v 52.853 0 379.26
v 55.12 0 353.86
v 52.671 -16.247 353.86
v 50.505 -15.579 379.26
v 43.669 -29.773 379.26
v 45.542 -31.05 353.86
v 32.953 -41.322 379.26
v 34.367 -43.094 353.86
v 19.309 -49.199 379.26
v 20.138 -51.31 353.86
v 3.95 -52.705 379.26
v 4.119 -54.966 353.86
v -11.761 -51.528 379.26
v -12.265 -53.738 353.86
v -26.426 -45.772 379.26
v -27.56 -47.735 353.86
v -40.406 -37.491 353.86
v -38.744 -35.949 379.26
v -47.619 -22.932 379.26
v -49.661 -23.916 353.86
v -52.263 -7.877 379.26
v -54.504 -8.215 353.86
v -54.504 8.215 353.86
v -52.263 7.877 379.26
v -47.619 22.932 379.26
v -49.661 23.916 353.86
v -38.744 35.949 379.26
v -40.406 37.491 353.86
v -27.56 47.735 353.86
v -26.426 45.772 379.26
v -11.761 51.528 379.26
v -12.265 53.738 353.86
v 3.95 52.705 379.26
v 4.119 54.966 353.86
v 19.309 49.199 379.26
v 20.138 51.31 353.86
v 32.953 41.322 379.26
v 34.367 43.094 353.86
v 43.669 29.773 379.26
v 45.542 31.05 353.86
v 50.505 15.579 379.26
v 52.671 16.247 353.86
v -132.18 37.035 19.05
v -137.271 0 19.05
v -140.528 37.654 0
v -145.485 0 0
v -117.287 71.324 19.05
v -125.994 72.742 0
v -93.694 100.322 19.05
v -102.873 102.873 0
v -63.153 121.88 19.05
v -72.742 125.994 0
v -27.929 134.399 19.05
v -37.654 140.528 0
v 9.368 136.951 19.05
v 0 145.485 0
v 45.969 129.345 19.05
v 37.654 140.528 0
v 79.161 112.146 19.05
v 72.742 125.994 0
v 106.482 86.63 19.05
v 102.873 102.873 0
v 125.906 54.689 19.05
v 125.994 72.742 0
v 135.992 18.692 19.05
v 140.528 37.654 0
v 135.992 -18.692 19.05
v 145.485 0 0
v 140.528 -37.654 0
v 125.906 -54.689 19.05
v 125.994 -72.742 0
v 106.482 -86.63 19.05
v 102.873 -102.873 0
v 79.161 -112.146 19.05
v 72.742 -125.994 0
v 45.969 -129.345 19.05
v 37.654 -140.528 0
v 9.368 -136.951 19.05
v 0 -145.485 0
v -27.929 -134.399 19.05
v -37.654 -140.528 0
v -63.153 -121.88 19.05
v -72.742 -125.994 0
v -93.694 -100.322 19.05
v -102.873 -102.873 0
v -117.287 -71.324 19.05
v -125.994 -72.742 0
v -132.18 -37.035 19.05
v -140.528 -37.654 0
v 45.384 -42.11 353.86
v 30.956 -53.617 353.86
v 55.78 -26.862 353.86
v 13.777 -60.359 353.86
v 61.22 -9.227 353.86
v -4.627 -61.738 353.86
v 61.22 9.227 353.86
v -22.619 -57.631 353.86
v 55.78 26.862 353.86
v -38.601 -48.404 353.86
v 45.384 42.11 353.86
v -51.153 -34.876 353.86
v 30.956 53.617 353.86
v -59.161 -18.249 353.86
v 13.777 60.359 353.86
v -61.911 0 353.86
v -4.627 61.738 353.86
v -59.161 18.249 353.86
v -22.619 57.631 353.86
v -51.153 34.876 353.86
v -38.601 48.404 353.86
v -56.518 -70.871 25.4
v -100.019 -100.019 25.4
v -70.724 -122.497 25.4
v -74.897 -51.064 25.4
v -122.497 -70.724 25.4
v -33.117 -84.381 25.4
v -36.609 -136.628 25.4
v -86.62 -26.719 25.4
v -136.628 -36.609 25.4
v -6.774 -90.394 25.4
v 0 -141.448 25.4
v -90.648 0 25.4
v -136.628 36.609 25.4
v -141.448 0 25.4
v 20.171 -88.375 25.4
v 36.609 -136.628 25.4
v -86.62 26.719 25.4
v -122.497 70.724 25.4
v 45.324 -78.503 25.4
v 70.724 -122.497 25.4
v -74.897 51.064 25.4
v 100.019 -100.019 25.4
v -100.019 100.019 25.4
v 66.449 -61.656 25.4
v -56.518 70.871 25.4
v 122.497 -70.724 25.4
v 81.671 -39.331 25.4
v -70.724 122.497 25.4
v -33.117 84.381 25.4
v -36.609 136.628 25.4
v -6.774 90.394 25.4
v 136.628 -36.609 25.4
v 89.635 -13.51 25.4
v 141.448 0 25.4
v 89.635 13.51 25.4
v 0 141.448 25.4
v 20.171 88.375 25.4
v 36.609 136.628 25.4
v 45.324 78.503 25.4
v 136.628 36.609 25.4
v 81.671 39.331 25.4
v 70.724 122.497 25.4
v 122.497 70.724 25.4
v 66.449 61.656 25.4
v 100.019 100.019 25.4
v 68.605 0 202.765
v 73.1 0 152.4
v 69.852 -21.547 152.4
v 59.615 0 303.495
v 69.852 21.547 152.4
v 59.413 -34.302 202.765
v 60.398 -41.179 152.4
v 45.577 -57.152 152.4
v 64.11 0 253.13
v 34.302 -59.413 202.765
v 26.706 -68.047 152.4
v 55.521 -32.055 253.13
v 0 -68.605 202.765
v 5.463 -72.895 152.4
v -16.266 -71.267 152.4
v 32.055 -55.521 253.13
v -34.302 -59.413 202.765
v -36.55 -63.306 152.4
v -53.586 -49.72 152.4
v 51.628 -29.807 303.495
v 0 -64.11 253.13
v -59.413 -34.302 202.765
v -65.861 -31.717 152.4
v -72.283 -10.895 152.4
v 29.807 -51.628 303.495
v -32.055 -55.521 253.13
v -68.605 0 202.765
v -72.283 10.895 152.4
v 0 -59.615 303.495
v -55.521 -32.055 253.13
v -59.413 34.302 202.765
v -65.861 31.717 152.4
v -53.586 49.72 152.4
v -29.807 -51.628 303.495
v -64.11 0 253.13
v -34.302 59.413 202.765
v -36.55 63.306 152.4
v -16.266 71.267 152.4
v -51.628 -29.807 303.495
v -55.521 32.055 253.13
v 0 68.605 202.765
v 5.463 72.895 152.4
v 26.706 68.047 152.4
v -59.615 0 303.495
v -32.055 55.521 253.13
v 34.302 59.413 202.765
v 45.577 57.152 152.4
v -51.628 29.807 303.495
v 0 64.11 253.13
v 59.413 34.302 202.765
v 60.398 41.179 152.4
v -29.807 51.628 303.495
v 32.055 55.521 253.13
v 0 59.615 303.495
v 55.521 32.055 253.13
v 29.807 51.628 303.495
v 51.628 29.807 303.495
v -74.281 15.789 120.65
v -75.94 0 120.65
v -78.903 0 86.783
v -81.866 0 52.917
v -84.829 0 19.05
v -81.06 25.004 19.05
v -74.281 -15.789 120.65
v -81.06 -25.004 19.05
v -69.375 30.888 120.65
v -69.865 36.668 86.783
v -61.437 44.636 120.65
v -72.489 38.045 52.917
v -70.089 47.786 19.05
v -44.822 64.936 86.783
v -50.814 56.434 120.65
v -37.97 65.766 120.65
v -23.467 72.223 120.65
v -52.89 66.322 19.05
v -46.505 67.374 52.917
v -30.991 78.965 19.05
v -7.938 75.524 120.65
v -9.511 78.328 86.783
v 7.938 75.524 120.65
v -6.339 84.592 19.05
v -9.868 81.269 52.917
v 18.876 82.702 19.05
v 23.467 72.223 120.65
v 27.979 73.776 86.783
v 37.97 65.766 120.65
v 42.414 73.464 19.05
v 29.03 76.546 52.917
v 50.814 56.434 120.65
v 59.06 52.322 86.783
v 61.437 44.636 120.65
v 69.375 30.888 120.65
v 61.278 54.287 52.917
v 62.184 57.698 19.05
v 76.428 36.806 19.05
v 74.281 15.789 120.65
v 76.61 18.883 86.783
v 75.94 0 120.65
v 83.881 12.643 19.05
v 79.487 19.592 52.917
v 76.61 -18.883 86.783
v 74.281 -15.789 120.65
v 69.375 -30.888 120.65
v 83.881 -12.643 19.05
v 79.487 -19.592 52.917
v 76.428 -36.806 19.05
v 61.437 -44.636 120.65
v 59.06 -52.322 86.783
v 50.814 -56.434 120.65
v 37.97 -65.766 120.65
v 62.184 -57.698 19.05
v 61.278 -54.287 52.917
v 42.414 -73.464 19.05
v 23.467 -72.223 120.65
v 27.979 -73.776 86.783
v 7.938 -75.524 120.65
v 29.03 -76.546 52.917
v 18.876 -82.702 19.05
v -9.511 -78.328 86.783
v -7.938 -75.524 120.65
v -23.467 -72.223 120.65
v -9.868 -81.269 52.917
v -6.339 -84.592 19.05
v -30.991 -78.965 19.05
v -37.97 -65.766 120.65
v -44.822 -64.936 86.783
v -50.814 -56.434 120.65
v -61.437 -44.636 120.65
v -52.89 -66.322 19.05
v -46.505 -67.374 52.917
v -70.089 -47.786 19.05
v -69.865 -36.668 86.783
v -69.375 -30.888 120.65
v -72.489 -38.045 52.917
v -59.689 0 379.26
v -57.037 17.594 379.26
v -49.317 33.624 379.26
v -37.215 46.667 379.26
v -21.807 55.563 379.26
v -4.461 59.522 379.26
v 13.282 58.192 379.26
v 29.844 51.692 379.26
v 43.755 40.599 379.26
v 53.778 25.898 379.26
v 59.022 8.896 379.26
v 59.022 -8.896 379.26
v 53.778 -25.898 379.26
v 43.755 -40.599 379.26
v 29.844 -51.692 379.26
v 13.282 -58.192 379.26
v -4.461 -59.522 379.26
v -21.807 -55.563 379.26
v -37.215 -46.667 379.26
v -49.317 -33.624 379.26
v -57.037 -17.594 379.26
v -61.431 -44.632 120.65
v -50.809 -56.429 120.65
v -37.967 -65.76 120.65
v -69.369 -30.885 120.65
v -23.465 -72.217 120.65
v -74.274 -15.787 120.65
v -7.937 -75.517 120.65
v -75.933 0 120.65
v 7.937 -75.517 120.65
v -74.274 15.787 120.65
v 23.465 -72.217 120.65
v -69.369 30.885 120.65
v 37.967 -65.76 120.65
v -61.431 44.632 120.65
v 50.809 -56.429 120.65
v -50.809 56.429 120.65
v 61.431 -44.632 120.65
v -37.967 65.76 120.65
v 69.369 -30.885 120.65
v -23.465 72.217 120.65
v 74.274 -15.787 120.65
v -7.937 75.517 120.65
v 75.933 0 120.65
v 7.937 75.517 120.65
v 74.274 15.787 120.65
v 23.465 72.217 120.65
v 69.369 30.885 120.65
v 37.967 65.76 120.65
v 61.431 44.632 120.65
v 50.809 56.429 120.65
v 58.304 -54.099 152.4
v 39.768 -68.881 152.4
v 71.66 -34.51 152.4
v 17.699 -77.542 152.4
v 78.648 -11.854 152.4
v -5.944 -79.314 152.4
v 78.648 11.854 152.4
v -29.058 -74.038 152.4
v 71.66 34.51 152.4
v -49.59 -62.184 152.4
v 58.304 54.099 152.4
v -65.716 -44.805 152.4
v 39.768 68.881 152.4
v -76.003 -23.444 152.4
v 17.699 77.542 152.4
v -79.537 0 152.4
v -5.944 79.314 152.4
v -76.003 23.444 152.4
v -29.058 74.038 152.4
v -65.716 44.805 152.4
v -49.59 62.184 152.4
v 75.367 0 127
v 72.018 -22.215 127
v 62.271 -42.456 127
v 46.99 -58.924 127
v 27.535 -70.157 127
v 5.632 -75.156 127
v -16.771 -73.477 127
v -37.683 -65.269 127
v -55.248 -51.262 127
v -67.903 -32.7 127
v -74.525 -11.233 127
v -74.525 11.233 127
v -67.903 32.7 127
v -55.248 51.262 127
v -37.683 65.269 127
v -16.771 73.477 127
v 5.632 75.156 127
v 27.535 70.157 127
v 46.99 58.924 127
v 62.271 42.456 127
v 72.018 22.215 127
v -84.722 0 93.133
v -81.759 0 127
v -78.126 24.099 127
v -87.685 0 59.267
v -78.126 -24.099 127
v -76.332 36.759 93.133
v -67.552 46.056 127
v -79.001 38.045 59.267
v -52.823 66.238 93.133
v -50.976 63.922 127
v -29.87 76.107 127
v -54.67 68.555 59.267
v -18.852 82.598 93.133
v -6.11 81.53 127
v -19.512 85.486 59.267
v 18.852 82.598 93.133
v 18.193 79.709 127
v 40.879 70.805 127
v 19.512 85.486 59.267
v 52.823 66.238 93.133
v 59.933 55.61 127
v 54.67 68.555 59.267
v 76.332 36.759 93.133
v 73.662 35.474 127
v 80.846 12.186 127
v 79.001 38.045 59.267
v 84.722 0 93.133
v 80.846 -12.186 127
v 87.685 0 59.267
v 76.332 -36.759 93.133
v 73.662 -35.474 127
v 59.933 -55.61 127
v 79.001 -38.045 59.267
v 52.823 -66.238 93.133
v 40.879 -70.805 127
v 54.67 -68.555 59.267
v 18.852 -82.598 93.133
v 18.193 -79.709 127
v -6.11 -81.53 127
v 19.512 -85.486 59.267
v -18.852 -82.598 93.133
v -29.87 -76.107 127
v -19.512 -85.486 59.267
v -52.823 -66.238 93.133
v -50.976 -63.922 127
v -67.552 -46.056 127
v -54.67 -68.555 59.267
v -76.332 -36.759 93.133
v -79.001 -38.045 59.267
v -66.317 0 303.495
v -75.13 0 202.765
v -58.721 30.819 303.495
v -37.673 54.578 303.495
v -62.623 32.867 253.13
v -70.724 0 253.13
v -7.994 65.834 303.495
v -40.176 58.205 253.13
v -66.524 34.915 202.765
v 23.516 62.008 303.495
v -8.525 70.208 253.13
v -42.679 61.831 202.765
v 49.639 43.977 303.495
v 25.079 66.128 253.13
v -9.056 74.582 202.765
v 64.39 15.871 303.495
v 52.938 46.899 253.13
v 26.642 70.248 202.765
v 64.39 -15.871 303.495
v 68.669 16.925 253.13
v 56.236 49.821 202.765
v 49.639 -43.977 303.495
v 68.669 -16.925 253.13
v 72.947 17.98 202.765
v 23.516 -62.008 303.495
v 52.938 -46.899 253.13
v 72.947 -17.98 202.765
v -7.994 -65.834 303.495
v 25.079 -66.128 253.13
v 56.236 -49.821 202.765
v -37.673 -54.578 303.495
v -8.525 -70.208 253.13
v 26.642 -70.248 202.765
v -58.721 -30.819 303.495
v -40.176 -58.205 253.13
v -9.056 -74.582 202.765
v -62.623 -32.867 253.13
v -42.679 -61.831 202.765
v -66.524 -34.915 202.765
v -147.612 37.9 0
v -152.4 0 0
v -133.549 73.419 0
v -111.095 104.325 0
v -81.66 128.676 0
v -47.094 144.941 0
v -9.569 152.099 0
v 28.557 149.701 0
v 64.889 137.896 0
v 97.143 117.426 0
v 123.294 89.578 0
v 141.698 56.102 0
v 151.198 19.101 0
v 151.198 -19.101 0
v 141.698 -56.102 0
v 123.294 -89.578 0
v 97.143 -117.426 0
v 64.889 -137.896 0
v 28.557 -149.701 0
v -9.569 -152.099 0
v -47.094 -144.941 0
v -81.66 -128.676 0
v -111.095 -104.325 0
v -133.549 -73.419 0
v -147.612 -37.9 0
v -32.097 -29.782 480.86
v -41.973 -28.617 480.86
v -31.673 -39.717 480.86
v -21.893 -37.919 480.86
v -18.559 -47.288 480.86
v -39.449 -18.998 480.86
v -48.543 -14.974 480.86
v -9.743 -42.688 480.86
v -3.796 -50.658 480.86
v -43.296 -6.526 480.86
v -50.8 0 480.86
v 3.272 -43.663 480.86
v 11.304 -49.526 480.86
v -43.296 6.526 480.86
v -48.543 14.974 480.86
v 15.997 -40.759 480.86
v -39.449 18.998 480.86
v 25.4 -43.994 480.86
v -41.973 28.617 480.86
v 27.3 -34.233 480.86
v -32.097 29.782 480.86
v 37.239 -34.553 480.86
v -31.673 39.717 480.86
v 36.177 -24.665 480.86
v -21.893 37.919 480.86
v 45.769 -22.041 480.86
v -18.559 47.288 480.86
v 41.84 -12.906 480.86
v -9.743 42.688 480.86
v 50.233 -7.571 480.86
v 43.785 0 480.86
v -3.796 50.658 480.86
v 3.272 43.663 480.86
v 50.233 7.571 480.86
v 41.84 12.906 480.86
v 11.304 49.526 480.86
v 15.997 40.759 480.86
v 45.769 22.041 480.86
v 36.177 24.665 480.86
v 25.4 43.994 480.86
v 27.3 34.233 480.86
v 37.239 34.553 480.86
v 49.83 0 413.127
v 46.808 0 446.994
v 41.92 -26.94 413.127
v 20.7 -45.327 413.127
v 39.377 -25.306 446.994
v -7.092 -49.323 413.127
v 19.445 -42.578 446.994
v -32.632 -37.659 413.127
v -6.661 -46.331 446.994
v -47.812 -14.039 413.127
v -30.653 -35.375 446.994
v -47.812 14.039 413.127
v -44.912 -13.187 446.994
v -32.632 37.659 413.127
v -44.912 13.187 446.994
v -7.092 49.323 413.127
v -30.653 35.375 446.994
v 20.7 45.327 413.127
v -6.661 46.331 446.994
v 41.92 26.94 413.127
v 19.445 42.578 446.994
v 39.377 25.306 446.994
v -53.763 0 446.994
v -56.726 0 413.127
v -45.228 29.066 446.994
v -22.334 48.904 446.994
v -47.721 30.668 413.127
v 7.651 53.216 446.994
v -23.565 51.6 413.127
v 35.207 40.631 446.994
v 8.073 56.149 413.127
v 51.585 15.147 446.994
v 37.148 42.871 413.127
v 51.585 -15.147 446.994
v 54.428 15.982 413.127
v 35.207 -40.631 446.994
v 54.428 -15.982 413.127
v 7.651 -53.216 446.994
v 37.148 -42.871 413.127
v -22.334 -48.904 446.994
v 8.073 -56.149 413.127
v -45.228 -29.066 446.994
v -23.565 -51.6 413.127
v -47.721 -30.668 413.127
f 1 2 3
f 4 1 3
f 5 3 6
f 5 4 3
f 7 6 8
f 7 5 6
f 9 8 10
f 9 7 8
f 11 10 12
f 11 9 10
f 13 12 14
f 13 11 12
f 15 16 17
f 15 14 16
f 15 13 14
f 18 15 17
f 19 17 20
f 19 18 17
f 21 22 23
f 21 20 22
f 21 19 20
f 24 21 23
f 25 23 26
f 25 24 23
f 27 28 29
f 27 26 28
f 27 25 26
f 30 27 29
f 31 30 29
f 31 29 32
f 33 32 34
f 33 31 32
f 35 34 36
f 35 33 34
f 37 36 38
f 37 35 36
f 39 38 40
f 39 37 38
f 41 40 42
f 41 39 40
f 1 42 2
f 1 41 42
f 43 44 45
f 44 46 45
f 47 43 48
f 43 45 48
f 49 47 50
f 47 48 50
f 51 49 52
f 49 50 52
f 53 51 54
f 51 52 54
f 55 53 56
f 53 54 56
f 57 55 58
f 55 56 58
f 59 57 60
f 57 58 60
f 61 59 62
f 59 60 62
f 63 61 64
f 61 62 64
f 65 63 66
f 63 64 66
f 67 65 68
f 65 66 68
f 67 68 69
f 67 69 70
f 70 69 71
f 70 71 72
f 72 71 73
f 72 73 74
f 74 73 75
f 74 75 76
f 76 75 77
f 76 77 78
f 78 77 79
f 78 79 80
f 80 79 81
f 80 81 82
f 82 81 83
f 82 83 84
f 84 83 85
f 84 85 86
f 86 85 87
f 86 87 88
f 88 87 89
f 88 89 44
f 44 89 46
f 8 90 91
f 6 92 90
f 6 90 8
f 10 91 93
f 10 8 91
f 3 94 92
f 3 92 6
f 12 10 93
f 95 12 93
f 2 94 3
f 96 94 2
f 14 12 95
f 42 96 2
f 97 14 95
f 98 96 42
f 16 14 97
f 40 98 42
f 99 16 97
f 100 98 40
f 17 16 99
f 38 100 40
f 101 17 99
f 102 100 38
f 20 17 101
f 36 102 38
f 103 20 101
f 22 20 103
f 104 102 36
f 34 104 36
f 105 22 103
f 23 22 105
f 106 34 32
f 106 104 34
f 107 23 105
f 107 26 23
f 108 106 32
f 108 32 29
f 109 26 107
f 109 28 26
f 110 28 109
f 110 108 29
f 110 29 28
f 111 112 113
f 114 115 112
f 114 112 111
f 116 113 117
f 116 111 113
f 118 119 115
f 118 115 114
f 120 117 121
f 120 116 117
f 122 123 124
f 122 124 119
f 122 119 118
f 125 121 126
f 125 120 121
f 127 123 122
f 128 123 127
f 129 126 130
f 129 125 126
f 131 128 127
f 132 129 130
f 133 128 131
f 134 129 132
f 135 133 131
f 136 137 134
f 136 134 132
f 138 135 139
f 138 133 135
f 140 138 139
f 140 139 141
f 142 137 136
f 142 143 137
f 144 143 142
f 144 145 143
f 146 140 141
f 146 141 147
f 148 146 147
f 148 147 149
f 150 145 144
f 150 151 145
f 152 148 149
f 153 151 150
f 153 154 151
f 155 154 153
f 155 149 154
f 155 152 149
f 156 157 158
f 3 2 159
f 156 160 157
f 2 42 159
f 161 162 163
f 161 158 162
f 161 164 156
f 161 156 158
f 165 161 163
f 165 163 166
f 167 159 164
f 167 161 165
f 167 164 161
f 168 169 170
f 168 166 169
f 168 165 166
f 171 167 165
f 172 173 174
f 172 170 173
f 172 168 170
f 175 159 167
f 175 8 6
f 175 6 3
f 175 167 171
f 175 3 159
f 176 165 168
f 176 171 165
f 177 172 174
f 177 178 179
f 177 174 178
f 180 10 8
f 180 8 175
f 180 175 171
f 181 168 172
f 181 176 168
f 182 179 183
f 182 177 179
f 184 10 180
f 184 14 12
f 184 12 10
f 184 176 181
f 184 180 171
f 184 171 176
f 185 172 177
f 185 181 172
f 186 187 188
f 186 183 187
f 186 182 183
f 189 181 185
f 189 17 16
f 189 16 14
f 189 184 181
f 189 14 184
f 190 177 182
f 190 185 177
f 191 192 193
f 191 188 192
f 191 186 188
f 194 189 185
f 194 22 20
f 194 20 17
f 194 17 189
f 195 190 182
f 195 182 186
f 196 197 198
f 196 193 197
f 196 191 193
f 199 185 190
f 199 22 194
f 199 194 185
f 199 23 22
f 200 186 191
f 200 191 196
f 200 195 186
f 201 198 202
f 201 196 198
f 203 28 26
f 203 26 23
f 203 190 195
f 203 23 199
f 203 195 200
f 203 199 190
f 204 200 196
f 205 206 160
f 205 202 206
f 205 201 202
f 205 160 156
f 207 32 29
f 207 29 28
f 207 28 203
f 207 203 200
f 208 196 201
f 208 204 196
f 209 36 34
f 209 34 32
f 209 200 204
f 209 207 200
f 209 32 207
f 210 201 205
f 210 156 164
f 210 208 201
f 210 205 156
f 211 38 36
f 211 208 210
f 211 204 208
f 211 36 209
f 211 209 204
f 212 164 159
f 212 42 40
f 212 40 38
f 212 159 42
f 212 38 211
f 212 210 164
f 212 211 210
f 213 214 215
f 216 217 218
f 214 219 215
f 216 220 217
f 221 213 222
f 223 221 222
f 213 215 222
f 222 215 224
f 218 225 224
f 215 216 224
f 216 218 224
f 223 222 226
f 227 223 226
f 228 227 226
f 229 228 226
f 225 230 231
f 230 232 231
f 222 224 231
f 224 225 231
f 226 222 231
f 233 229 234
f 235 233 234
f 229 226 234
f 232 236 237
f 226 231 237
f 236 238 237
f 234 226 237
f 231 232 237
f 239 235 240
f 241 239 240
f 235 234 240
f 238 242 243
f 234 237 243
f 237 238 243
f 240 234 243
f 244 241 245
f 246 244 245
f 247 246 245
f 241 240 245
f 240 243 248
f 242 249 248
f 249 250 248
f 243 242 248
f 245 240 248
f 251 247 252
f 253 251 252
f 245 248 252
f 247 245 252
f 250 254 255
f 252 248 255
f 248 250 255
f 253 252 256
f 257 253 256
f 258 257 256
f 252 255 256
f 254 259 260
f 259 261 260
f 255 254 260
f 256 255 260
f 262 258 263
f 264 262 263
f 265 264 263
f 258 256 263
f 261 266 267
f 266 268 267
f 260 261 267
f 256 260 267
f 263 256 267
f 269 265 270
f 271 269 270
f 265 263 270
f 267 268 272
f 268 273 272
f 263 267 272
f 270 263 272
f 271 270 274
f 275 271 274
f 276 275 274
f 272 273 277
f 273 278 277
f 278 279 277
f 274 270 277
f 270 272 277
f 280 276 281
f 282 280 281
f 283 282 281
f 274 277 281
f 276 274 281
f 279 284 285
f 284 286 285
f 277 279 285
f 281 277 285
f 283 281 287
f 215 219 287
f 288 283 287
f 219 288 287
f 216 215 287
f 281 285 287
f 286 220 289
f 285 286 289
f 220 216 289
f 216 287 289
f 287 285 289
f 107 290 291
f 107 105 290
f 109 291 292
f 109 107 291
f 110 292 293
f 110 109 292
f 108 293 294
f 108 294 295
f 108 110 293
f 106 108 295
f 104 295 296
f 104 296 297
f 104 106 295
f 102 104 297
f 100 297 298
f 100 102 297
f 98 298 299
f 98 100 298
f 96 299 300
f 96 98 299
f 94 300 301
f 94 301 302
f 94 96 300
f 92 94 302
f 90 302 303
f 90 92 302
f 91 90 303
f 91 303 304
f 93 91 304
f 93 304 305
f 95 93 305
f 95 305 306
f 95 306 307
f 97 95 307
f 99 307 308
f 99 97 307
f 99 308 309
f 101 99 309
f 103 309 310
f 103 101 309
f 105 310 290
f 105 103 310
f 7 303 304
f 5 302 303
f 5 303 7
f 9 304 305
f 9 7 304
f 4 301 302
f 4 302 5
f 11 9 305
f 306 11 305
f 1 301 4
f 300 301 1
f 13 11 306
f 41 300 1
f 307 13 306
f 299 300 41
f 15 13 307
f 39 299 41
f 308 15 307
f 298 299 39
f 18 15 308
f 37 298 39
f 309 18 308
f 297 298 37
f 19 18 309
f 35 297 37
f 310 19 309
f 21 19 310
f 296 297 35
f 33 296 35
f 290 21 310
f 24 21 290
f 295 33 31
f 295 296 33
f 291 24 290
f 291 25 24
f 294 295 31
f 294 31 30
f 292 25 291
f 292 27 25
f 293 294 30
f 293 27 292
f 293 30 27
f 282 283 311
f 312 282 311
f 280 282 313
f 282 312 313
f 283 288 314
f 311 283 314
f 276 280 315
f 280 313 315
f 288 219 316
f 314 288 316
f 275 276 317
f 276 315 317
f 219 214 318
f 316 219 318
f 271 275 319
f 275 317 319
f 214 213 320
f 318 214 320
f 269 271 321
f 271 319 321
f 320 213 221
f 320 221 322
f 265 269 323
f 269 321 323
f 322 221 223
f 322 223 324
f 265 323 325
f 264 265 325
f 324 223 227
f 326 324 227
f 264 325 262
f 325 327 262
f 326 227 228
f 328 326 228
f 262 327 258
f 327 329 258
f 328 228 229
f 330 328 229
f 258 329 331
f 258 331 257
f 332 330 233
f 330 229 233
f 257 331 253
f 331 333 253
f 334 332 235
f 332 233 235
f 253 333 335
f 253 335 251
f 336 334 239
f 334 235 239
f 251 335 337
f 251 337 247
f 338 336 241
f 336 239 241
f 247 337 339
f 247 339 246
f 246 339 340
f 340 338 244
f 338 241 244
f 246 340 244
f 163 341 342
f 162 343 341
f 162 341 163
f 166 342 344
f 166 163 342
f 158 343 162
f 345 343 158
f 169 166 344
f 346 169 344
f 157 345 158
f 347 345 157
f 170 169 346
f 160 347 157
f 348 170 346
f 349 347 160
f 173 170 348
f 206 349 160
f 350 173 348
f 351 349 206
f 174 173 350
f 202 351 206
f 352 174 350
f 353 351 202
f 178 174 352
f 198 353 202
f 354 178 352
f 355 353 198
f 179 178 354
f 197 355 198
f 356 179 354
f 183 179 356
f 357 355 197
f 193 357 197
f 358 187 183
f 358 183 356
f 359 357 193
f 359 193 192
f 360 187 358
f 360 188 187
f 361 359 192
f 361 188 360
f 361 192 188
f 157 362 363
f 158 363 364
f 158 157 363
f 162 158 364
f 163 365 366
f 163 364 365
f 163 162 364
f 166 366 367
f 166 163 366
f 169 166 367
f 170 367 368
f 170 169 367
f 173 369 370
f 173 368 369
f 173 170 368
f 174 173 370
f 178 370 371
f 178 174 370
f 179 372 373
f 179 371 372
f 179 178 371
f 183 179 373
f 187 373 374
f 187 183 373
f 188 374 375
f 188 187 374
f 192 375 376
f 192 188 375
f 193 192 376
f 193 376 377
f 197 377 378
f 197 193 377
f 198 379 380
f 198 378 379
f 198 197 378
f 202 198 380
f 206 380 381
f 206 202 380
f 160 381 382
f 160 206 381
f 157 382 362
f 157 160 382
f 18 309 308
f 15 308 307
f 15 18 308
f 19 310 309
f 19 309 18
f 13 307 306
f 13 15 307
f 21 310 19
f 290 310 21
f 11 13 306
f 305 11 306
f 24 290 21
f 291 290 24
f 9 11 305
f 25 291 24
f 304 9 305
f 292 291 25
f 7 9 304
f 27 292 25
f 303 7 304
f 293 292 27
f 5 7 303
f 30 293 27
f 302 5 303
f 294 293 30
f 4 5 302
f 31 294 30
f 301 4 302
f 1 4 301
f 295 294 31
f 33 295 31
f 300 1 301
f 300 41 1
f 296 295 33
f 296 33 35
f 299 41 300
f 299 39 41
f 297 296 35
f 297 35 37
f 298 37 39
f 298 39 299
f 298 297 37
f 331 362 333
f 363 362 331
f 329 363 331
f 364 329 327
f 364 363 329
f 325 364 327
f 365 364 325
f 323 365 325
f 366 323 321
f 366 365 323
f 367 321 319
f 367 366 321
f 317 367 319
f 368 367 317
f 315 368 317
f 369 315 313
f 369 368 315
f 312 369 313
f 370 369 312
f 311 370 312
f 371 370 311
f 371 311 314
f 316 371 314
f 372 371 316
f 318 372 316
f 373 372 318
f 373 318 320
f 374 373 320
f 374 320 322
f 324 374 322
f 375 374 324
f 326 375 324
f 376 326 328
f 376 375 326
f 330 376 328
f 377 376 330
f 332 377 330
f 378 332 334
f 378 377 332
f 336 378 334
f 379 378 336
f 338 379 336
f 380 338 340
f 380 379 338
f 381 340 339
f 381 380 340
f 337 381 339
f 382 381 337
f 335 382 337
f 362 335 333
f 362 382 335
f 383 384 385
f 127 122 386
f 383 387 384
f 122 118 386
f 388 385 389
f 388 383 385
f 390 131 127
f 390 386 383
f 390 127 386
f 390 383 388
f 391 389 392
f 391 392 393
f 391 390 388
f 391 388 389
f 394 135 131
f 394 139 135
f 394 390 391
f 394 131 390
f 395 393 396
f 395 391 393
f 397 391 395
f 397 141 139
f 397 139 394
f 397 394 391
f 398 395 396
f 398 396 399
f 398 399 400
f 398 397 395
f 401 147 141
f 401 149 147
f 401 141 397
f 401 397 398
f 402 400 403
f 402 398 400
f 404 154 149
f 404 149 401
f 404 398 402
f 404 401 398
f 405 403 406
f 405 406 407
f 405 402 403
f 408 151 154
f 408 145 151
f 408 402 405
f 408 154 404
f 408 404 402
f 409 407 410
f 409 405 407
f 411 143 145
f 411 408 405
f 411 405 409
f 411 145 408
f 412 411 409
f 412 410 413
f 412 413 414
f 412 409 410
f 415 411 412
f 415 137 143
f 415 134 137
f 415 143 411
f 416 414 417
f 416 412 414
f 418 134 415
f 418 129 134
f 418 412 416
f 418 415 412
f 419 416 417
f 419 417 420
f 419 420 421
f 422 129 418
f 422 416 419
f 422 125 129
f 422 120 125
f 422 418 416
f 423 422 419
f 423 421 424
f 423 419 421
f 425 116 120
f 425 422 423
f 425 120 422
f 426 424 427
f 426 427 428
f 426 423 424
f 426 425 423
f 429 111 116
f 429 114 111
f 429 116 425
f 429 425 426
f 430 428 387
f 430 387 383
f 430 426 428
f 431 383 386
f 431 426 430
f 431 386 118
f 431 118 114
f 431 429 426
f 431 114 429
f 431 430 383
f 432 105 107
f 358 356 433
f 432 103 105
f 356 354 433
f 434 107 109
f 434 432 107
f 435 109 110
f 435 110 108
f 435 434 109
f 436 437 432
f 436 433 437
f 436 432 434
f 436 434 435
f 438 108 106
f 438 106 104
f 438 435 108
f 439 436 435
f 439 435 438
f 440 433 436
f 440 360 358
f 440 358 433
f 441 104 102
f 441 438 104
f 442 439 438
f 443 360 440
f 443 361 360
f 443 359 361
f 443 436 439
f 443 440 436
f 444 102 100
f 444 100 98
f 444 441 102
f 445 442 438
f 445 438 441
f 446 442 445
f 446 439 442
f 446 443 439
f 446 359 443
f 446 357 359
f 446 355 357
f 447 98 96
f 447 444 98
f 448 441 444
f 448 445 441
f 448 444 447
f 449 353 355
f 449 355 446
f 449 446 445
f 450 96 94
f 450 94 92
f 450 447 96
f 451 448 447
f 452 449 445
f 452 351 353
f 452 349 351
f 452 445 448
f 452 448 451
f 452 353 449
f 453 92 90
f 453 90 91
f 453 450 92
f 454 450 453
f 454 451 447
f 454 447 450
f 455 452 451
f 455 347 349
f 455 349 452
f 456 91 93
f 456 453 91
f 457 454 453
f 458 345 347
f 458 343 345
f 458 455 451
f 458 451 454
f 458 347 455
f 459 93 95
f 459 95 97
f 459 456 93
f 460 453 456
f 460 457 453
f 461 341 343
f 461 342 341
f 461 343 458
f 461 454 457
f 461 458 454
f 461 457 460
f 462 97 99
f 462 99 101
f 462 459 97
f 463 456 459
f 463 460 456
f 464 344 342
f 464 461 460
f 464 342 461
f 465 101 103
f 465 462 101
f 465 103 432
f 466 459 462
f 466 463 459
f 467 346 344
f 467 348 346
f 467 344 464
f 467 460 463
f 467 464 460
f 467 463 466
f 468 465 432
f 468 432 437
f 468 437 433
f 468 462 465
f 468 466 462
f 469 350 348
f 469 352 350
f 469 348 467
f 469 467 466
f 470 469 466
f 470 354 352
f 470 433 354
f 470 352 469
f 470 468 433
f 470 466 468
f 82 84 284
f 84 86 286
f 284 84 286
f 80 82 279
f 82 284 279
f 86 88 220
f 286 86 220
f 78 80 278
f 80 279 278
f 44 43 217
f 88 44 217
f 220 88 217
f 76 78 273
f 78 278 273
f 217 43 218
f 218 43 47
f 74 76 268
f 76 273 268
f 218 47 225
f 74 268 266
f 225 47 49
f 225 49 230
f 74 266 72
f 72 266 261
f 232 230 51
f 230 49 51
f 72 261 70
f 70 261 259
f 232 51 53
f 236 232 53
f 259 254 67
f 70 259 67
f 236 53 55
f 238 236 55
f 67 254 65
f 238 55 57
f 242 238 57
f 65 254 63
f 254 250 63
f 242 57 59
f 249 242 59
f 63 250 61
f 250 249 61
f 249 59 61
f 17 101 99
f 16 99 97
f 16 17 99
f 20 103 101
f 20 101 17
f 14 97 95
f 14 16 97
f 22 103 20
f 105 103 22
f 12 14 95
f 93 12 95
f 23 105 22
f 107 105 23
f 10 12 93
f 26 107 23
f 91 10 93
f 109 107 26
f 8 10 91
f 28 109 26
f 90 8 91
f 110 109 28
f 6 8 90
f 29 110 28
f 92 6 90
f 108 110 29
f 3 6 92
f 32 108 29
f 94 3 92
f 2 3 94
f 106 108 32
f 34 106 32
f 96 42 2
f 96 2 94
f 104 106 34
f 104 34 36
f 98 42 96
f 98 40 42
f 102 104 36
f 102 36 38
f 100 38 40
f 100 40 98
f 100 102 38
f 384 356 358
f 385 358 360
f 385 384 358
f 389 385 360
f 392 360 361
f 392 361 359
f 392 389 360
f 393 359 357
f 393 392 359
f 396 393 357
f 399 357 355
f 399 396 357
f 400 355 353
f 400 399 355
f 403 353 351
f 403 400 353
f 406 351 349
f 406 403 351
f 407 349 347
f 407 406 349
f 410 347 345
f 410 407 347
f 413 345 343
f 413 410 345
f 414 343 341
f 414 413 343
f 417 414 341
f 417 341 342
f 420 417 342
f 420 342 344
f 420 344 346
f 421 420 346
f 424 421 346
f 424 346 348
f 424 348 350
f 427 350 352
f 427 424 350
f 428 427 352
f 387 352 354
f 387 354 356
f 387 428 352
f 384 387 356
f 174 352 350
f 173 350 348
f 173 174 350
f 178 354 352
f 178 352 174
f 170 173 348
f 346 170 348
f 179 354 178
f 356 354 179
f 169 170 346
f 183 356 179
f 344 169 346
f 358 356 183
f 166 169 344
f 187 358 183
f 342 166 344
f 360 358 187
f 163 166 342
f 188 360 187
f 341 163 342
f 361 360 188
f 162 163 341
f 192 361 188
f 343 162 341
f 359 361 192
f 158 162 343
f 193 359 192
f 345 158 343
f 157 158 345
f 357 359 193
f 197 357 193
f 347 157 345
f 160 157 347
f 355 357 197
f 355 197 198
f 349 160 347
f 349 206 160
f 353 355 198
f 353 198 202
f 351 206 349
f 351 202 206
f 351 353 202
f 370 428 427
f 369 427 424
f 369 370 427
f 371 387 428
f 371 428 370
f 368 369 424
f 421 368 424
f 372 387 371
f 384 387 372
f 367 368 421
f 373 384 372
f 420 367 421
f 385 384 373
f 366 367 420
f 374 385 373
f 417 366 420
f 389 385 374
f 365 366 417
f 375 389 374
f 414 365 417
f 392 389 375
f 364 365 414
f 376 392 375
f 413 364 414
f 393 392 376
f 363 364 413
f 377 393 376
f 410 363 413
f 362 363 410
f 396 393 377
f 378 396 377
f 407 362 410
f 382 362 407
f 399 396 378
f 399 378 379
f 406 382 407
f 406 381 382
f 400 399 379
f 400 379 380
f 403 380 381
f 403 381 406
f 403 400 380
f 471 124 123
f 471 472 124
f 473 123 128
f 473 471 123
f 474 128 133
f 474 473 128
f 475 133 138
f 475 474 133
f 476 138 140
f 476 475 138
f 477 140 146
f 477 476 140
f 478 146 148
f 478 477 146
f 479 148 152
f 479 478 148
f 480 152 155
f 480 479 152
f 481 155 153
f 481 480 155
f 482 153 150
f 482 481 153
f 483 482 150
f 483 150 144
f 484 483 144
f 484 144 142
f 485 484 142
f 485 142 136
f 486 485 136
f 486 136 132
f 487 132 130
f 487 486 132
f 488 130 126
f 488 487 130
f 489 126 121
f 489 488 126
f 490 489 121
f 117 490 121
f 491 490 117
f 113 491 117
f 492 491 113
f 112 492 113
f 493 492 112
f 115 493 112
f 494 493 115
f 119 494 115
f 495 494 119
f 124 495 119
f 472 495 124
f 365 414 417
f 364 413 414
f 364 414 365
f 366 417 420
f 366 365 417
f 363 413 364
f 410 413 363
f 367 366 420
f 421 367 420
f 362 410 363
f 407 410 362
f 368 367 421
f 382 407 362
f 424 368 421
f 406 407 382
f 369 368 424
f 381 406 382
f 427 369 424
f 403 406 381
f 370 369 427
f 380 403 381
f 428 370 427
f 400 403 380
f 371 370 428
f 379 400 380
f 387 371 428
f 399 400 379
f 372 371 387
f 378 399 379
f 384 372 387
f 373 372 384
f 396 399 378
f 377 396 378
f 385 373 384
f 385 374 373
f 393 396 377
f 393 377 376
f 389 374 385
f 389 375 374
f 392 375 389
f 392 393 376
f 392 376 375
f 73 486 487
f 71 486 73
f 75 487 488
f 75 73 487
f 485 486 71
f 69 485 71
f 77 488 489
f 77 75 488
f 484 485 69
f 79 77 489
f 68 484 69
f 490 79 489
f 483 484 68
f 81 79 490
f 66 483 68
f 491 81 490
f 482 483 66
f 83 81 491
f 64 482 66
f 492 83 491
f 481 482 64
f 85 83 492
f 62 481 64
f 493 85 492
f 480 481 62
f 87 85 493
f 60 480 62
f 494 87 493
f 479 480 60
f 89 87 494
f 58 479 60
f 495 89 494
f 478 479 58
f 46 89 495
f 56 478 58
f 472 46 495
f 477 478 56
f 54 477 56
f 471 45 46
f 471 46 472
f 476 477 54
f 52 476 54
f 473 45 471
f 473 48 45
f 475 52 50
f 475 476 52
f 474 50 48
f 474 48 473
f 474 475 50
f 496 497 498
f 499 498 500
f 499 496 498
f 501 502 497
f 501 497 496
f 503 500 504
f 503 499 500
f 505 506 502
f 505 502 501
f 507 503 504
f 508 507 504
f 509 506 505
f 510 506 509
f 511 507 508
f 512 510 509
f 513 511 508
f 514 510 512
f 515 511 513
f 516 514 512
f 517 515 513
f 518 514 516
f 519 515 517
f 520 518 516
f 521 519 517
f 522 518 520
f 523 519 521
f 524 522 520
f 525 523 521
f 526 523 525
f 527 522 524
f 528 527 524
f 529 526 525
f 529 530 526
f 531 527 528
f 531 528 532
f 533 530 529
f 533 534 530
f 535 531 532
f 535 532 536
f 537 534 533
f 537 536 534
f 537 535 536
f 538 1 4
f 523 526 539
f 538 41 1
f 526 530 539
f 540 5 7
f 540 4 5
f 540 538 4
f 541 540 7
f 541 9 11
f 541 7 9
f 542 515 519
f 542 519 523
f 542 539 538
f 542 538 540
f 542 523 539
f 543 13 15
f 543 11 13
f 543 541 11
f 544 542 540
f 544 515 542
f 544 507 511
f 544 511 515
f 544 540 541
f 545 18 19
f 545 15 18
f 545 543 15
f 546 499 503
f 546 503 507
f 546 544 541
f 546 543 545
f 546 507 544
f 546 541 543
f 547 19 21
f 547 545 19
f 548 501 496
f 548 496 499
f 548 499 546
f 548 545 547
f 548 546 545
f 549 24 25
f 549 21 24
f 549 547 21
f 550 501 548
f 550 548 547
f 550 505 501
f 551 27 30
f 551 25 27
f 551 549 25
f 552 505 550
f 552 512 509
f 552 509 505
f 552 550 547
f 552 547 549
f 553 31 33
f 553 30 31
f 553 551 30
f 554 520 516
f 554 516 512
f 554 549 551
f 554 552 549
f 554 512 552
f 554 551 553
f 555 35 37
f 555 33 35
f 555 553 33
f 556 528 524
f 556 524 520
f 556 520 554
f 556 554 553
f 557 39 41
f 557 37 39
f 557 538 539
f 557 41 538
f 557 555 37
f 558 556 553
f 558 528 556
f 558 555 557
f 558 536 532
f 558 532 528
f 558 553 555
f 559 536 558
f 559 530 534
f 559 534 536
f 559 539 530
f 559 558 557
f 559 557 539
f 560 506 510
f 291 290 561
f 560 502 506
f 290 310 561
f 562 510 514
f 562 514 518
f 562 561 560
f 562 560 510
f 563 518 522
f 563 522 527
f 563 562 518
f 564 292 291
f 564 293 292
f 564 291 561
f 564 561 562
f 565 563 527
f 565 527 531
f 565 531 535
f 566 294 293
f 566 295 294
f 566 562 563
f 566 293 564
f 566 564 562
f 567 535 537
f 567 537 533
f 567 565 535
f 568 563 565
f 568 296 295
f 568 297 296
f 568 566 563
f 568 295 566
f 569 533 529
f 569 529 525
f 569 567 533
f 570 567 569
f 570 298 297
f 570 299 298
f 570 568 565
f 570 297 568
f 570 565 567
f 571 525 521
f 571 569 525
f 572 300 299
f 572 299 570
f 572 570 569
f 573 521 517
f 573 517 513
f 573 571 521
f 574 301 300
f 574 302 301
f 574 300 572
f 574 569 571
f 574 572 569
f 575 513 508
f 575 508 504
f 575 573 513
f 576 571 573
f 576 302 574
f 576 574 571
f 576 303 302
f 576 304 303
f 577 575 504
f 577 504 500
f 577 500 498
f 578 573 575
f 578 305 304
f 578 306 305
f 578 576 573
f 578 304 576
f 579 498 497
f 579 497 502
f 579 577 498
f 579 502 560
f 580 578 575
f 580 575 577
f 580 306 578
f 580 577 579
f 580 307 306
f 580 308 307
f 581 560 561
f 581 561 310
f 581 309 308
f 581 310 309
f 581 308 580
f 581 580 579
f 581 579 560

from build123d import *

# Parameters (mm, degrees)
F6_T     = -6.35
F7_R     = 75.9333
F8_DEPTH = 360.2112159675
F8_TAPER = 5.1


with BuildPart() as f1:
    # F0 (on Front) → F1 (revolve)
    with BuildSketch(Plane.XZ):
        Polygon((-141.4476055842, 25.4), (-152.4, 0), (0, 0), (0, 127), (-81.75875737, 127), (-90.6476055842, 25.4), align=None)
    revolve(axis=Axis((0, 0, 240.4301079838), (0, 0, -1)))

    # F6
    f6_openings = [f1.faces().sort_by_distance(p)[0] for p in [
        (0, 0, 0),
    ]]
    offset(amount=F6_T, openings=f6_openings, kind=Kind.INTERSECTION)


with BuildPart() as f2:
    # F0 (on Front) → F2 (revolve)
    with BuildSketch(Plane.XZ):
        Polygon((-81.75875737, 127), (0, 127), (0, 152.4), (-79.5365453164, 152.4), align=None)
    revolve(axis=Axis((0, 0, 240.4301079838), (0, 0, -1)))


with BuildPart() as f3:
    # F0 (on Front) → F3 (revolve)
    with BuildSketch(Plane.XZ):
        Polygon((-79.5365453164, 152.4), (0, 152.4), (0, 353.8602159675), (-61.9110602678, 353.8602159675), align=None)
    revolve(axis=Axis((0, 0, 240.4301079838), (0, 0, -1)))


with BuildPart() as f4:
    # F0 (on Front) → F4 (revolve)
    with BuildSketch(Plane.XZ):
        Polygon((-61.9110602678, 353.8602159675), (0, 353.8602159675), (0, 379.2602159675), (-59.6888482142, 379.2602159675), align=None)
    revolve(axis=Axis((0, 0, 240.4301079838), (0, 0, -1)))


with BuildPart() as f5:
    # F0 (on Front) → F5 (revolve)
    with BuildSketch(Plane.XZ):
        Polygon((-59.6888482142, 379.2602159675), (0, 379.2602159675), (0, 480.8602159675), (-50.8, 480.8602159675), align=None)
    revolve(axis=Axis((0, 0, 240.4301079838), (0, 0, -1)))


with BuildPart() as f8_tool:
    # F7 (on face) → F8 (new body, through all)
    with BuildSketch(Plane(origin=(0, 0, 120.65), x_dir=(1, 0, 0), z_dir=(0, 0, -1))):
        Circle(F7_R)
    extrude(amount=-F8_DEPTH, taper=F8_TAPER)


with BuildPart() as f1_1:
    add(f1.part)

    # F8: cut by f8_tool
    add(f8_tool.part, mode=Mode.SUBTRACT)


with BuildPart() as f2_1:
    add(f2.part)

    # F8: cut by f8_tool
    add(f8_tool.part, mode=Mode.SUBTRACT)


with BuildPart() as f3_1:
    add(f3.part)

    # F8: cut by f8_tool
    add(f8_tool.part, mode=Mode.SUBTRACT)


with BuildPart() as f4_1:
    add(f4.part)

    # F8: cut by f8_tool
    add(f8_tool.part, mode=Mode.SUBTRACT)


with BuildPart() as f5_1:
    add(f5.part)

    # F8: cut by f8_tool
    add(f8_tool.part, mode=Mode.SUBTRACT)


solid = Compound([f1_1.part, f2_1.part, f3_1.part, f4_1.part, f5_1.part])
